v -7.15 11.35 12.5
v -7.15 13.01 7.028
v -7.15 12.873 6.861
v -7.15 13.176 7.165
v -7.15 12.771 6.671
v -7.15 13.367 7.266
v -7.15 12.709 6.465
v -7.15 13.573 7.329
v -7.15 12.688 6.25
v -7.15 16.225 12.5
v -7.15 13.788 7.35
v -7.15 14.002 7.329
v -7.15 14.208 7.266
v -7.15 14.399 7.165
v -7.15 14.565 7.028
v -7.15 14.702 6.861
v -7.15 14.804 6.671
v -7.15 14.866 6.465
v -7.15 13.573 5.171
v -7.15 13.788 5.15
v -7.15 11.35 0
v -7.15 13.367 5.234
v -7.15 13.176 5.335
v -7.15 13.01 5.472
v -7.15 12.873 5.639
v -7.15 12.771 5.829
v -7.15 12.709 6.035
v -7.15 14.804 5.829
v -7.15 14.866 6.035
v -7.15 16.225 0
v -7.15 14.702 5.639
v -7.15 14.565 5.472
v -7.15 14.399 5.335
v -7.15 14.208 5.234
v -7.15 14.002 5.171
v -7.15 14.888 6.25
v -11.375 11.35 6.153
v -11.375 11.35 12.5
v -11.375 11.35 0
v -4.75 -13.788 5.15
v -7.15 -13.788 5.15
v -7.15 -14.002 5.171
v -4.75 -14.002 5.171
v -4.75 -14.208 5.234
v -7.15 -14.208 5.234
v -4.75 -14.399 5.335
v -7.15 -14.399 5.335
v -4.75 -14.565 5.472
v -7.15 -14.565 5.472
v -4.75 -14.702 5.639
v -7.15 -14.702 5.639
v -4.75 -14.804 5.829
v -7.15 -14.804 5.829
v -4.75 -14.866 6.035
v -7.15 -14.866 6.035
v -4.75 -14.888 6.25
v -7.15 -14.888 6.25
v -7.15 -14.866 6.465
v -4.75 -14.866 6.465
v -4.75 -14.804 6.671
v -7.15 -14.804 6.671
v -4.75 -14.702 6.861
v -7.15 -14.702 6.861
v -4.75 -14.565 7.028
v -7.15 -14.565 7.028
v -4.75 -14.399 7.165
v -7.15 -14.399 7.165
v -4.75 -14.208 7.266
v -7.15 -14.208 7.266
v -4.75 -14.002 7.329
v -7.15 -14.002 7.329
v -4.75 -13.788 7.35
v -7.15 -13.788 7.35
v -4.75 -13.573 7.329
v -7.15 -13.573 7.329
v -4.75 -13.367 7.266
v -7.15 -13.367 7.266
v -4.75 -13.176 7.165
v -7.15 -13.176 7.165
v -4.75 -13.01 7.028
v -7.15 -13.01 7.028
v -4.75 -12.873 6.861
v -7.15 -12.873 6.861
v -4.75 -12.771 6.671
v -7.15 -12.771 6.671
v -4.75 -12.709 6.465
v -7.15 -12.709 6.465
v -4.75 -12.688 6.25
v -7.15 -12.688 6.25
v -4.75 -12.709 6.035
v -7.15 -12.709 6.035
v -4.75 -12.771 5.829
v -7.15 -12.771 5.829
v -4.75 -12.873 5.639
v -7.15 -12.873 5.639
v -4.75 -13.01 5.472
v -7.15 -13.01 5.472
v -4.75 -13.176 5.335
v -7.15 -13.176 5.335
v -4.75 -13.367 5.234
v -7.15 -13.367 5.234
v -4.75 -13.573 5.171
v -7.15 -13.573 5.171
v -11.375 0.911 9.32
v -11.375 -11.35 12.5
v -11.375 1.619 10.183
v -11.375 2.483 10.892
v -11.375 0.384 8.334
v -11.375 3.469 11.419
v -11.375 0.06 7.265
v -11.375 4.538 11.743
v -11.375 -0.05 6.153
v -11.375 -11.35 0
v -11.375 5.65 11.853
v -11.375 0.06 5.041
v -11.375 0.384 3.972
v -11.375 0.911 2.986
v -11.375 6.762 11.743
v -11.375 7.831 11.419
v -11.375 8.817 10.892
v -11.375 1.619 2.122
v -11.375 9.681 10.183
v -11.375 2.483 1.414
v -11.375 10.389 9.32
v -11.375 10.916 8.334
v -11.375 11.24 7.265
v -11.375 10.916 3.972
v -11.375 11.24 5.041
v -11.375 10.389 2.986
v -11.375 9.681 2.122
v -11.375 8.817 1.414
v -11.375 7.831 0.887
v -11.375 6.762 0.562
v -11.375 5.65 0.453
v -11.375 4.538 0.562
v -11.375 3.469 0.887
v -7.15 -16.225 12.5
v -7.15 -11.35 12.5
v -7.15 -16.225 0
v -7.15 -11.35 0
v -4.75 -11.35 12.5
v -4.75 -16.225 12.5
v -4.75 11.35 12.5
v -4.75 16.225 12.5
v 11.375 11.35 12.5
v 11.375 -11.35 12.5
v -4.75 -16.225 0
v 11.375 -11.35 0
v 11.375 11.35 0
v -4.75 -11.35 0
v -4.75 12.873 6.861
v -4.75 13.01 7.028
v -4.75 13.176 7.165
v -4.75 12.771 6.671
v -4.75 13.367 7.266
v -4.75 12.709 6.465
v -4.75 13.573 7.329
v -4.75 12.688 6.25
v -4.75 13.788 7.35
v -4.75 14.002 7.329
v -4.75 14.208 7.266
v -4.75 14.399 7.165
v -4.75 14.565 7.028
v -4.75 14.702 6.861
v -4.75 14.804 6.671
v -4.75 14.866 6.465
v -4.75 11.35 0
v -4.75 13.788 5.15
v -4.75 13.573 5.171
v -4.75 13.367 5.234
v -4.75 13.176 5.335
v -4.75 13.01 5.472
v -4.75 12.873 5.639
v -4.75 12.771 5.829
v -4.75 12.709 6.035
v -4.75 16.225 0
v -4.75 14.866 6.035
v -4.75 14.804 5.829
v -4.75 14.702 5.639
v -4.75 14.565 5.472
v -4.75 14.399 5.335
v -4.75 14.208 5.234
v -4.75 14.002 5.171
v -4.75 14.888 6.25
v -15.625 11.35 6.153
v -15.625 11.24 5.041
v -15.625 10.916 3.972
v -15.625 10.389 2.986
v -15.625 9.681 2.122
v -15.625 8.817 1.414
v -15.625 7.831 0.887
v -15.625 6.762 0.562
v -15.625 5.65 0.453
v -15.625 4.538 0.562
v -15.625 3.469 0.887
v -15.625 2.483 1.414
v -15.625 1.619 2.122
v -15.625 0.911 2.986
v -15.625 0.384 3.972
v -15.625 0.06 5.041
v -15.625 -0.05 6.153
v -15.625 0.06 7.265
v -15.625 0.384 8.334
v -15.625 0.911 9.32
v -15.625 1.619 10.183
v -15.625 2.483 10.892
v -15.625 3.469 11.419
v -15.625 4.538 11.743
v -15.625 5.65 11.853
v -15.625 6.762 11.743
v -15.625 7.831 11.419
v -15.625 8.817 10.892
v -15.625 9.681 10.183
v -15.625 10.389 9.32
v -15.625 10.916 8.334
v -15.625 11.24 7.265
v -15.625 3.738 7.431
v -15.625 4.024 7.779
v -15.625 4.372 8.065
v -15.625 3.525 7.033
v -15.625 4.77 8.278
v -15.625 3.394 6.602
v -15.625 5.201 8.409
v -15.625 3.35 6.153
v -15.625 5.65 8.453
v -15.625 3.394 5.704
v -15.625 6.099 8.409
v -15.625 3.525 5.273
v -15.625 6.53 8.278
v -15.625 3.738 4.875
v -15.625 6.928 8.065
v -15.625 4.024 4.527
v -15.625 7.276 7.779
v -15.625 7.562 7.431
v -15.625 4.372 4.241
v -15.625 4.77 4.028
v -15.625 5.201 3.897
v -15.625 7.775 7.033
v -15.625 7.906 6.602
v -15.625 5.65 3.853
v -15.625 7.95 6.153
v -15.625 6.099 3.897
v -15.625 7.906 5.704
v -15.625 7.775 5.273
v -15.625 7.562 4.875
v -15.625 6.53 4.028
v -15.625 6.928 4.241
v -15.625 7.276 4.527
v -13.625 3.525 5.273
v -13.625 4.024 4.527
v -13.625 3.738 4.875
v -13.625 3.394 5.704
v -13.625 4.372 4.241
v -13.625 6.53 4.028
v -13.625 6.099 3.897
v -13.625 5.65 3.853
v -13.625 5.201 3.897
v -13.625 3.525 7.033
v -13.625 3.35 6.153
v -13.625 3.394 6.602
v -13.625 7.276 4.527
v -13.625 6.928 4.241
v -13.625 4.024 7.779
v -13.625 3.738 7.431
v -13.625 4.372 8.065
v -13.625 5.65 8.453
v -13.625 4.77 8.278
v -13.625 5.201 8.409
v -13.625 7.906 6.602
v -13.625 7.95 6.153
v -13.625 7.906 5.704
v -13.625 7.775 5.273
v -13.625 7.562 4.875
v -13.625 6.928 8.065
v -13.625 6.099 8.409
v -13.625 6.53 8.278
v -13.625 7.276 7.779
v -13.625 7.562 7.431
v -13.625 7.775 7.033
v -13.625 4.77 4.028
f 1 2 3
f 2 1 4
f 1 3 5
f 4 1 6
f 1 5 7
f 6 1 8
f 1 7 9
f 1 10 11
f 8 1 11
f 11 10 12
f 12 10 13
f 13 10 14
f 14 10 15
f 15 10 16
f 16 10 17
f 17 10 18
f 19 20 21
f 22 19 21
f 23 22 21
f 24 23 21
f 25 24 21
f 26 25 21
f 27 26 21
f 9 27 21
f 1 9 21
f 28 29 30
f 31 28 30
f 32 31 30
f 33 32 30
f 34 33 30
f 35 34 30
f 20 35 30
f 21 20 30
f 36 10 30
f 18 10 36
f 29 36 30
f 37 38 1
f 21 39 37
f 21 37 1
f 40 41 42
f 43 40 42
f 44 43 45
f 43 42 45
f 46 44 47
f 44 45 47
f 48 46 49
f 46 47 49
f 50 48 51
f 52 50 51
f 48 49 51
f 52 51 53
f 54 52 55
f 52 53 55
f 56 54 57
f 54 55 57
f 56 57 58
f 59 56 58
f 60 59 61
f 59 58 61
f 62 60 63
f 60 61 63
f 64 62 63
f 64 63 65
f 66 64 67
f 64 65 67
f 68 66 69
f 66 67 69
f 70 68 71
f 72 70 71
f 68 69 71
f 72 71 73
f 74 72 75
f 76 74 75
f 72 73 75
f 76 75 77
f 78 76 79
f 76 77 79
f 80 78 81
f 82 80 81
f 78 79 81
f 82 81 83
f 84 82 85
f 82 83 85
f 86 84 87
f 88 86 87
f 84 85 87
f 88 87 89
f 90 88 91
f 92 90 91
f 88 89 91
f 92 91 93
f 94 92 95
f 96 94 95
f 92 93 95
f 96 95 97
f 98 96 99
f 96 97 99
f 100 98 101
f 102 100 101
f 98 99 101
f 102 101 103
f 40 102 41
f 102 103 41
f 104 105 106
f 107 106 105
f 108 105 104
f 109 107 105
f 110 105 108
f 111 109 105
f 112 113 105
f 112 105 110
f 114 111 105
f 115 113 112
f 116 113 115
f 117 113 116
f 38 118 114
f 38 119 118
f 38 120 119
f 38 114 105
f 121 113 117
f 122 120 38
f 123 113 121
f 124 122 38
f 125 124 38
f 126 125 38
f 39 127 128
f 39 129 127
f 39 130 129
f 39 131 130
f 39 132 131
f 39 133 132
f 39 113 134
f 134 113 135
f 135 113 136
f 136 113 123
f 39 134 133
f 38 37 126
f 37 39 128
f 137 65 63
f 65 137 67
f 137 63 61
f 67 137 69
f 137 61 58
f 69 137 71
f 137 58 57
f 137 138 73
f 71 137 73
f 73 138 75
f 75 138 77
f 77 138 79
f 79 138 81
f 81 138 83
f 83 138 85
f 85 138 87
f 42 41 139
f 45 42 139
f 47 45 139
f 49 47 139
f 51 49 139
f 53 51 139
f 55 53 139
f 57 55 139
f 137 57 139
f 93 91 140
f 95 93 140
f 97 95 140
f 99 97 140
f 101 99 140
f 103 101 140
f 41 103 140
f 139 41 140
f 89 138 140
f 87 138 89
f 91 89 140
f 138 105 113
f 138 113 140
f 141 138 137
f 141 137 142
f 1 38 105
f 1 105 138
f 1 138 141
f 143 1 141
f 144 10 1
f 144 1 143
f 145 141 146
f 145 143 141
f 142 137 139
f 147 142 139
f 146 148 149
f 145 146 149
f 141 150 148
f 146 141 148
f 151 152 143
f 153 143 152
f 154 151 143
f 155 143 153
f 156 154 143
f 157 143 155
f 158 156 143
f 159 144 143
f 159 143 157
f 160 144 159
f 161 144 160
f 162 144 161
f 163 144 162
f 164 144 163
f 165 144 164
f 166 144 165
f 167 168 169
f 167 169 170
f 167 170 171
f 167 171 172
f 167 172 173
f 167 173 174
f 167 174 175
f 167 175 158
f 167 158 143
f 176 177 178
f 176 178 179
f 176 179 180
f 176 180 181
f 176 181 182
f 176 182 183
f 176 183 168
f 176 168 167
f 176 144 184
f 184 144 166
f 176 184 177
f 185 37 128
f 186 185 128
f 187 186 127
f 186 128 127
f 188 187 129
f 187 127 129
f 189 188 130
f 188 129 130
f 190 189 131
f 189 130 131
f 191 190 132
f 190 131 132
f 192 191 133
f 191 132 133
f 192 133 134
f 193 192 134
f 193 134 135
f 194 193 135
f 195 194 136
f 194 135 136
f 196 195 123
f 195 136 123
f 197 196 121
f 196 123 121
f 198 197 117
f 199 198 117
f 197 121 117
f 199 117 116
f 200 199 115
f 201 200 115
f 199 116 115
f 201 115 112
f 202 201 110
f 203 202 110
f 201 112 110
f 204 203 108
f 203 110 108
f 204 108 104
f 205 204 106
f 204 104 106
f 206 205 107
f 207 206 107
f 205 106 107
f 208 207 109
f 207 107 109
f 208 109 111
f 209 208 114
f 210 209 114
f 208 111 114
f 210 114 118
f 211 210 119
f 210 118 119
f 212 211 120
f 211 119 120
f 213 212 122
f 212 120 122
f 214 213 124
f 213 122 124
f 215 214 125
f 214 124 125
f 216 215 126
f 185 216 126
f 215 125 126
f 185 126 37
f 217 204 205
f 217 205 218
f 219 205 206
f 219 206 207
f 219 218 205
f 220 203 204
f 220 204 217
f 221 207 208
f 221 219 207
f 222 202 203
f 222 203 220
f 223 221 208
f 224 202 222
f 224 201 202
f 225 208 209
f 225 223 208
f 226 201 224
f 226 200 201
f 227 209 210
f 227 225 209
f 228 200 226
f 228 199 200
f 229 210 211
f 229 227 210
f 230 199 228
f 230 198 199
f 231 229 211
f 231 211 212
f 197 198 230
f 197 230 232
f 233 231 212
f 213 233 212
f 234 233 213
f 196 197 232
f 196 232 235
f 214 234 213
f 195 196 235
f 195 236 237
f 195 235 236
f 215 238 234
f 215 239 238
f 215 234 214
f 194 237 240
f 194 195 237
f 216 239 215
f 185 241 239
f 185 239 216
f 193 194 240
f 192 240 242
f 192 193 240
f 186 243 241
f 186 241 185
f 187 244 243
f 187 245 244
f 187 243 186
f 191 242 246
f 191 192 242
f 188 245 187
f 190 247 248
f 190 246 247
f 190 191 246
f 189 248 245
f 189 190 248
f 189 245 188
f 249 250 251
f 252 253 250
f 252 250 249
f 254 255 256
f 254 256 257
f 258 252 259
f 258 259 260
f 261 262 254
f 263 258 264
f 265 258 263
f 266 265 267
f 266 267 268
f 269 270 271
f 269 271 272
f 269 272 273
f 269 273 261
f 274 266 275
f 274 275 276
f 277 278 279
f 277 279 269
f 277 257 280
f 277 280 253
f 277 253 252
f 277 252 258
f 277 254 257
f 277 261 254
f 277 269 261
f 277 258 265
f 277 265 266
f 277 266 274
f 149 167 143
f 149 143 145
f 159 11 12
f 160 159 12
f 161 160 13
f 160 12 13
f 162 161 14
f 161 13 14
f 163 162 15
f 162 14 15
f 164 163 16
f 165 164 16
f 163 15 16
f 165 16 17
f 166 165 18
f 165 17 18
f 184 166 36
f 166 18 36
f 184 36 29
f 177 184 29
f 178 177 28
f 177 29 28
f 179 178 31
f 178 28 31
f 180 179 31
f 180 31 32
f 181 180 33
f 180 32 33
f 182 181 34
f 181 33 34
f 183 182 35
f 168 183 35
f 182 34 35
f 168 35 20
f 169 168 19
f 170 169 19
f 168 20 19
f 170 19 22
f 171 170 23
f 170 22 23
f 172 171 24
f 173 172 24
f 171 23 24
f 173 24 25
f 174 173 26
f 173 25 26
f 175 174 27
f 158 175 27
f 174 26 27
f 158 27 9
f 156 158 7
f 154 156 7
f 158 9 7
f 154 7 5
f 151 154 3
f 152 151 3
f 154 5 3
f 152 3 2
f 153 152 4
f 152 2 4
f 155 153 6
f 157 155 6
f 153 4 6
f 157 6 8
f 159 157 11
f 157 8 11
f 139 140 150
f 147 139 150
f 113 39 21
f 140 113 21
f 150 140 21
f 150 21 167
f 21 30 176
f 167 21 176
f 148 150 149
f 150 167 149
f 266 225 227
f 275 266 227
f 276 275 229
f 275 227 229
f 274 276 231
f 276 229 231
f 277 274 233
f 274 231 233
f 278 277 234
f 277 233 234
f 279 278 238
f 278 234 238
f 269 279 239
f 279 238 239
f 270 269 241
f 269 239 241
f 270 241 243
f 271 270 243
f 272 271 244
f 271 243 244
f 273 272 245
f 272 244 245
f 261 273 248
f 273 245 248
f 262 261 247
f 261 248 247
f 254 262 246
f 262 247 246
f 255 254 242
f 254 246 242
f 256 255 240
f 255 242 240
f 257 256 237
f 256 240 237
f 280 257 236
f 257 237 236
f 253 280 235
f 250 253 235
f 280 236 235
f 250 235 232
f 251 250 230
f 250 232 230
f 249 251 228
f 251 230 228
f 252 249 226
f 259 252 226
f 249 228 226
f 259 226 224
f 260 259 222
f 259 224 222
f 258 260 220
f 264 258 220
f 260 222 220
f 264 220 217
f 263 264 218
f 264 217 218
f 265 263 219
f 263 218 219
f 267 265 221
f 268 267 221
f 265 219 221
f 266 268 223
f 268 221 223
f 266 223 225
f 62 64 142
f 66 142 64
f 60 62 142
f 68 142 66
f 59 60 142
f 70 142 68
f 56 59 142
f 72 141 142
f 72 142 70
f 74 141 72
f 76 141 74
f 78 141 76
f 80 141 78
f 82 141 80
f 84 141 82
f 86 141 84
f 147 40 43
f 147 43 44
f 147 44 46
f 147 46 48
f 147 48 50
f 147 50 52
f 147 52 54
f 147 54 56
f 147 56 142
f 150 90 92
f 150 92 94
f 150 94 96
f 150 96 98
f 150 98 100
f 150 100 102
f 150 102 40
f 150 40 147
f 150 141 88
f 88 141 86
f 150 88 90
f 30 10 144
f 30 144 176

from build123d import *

# Parameters (mm, degrees)
SKETCH1_W           = 22.75
SKETCH1_H           = 22.7
BOSS_EXTRUDE1_DEPTH = 12.5
SKETCH2_R           = 5.7
BOSS_EXTRUDE2_DEPTH = 4.25
SKETCH3_R           = 2.3
CUT_EXTRUDE1_DEPTH  = 2
SKETCH4_W           = 12.5
SKETCH4_H           = 4.875
BOSS_EXTRUDE3_DEPTH = 2.4
SKETCH5_R           = 1.1
CUT_EXTRUDE2_DEPTH  = 2.4


with BuildPart() as part:
    # Sketch1 → Boss-Extrude1 (new body)
    with BuildSketch(Plane.XY):
        Rectangle(SKETCH1_W, SKETCH1_H)
    extrude(amount=BOSS_EXTRUDE1_DEPTH)

    # Sketch2 → Boss-Extrude2 (add)
    with BuildSketch(Plane.ZY.offset(11.375)):
        with Locations(Location((6.152972547, 5.65, 0), (0, 0, 90))):
            Circle(SKETCH2_R)
    extrude(amount=BOSS_EXTRUDE2_DEPTH)

    # Sketch3 → Cut-Extrude1 (cut)
    with BuildSketch(Plane.ZY.offset(15.625)):
        with Locations((6.152972547, 5.65)):
            Circle(SKETCH3_R)
    extrude(amount=-CUT_EXTRUDE1_DEPTH, mode=Mode.SUBTRACT)

    # Sketch4 → Boss-Extrude3 (add)
    with BuildSketch(Plane(origin=(-7.15, 0, 0), x_dir=(0, 0, -1), z_dir=(1, 0, 0))):
        with Locations((-6.25, 13.7875)):
            Rectangle(SKETCH4_W, SKETCH4_H)
        with Locations((-6.25, -13.7875)):
            Rectangle(SKETCH4_W, SKETCH4_H)
    extrude(amount=BOSS_EXTRUDE3_DEPTH)

    # Sketch5 → Cut-Extrude2 (cut)
    with BuildSketch(Plane.ZY.offset(7.15)):
        with Locations((6.25, 13.7875)):
            Circle(SKETCH5_R)
        with Locations(Location((6.25, -13.7875, 0), (0, 0, 180))):
            Circle(SKETCH5_R)
    extrude(amount=-CUT_EXTRUDE2_DEPTH, mode=Mode.SUBTRACT)


solid = part.part
